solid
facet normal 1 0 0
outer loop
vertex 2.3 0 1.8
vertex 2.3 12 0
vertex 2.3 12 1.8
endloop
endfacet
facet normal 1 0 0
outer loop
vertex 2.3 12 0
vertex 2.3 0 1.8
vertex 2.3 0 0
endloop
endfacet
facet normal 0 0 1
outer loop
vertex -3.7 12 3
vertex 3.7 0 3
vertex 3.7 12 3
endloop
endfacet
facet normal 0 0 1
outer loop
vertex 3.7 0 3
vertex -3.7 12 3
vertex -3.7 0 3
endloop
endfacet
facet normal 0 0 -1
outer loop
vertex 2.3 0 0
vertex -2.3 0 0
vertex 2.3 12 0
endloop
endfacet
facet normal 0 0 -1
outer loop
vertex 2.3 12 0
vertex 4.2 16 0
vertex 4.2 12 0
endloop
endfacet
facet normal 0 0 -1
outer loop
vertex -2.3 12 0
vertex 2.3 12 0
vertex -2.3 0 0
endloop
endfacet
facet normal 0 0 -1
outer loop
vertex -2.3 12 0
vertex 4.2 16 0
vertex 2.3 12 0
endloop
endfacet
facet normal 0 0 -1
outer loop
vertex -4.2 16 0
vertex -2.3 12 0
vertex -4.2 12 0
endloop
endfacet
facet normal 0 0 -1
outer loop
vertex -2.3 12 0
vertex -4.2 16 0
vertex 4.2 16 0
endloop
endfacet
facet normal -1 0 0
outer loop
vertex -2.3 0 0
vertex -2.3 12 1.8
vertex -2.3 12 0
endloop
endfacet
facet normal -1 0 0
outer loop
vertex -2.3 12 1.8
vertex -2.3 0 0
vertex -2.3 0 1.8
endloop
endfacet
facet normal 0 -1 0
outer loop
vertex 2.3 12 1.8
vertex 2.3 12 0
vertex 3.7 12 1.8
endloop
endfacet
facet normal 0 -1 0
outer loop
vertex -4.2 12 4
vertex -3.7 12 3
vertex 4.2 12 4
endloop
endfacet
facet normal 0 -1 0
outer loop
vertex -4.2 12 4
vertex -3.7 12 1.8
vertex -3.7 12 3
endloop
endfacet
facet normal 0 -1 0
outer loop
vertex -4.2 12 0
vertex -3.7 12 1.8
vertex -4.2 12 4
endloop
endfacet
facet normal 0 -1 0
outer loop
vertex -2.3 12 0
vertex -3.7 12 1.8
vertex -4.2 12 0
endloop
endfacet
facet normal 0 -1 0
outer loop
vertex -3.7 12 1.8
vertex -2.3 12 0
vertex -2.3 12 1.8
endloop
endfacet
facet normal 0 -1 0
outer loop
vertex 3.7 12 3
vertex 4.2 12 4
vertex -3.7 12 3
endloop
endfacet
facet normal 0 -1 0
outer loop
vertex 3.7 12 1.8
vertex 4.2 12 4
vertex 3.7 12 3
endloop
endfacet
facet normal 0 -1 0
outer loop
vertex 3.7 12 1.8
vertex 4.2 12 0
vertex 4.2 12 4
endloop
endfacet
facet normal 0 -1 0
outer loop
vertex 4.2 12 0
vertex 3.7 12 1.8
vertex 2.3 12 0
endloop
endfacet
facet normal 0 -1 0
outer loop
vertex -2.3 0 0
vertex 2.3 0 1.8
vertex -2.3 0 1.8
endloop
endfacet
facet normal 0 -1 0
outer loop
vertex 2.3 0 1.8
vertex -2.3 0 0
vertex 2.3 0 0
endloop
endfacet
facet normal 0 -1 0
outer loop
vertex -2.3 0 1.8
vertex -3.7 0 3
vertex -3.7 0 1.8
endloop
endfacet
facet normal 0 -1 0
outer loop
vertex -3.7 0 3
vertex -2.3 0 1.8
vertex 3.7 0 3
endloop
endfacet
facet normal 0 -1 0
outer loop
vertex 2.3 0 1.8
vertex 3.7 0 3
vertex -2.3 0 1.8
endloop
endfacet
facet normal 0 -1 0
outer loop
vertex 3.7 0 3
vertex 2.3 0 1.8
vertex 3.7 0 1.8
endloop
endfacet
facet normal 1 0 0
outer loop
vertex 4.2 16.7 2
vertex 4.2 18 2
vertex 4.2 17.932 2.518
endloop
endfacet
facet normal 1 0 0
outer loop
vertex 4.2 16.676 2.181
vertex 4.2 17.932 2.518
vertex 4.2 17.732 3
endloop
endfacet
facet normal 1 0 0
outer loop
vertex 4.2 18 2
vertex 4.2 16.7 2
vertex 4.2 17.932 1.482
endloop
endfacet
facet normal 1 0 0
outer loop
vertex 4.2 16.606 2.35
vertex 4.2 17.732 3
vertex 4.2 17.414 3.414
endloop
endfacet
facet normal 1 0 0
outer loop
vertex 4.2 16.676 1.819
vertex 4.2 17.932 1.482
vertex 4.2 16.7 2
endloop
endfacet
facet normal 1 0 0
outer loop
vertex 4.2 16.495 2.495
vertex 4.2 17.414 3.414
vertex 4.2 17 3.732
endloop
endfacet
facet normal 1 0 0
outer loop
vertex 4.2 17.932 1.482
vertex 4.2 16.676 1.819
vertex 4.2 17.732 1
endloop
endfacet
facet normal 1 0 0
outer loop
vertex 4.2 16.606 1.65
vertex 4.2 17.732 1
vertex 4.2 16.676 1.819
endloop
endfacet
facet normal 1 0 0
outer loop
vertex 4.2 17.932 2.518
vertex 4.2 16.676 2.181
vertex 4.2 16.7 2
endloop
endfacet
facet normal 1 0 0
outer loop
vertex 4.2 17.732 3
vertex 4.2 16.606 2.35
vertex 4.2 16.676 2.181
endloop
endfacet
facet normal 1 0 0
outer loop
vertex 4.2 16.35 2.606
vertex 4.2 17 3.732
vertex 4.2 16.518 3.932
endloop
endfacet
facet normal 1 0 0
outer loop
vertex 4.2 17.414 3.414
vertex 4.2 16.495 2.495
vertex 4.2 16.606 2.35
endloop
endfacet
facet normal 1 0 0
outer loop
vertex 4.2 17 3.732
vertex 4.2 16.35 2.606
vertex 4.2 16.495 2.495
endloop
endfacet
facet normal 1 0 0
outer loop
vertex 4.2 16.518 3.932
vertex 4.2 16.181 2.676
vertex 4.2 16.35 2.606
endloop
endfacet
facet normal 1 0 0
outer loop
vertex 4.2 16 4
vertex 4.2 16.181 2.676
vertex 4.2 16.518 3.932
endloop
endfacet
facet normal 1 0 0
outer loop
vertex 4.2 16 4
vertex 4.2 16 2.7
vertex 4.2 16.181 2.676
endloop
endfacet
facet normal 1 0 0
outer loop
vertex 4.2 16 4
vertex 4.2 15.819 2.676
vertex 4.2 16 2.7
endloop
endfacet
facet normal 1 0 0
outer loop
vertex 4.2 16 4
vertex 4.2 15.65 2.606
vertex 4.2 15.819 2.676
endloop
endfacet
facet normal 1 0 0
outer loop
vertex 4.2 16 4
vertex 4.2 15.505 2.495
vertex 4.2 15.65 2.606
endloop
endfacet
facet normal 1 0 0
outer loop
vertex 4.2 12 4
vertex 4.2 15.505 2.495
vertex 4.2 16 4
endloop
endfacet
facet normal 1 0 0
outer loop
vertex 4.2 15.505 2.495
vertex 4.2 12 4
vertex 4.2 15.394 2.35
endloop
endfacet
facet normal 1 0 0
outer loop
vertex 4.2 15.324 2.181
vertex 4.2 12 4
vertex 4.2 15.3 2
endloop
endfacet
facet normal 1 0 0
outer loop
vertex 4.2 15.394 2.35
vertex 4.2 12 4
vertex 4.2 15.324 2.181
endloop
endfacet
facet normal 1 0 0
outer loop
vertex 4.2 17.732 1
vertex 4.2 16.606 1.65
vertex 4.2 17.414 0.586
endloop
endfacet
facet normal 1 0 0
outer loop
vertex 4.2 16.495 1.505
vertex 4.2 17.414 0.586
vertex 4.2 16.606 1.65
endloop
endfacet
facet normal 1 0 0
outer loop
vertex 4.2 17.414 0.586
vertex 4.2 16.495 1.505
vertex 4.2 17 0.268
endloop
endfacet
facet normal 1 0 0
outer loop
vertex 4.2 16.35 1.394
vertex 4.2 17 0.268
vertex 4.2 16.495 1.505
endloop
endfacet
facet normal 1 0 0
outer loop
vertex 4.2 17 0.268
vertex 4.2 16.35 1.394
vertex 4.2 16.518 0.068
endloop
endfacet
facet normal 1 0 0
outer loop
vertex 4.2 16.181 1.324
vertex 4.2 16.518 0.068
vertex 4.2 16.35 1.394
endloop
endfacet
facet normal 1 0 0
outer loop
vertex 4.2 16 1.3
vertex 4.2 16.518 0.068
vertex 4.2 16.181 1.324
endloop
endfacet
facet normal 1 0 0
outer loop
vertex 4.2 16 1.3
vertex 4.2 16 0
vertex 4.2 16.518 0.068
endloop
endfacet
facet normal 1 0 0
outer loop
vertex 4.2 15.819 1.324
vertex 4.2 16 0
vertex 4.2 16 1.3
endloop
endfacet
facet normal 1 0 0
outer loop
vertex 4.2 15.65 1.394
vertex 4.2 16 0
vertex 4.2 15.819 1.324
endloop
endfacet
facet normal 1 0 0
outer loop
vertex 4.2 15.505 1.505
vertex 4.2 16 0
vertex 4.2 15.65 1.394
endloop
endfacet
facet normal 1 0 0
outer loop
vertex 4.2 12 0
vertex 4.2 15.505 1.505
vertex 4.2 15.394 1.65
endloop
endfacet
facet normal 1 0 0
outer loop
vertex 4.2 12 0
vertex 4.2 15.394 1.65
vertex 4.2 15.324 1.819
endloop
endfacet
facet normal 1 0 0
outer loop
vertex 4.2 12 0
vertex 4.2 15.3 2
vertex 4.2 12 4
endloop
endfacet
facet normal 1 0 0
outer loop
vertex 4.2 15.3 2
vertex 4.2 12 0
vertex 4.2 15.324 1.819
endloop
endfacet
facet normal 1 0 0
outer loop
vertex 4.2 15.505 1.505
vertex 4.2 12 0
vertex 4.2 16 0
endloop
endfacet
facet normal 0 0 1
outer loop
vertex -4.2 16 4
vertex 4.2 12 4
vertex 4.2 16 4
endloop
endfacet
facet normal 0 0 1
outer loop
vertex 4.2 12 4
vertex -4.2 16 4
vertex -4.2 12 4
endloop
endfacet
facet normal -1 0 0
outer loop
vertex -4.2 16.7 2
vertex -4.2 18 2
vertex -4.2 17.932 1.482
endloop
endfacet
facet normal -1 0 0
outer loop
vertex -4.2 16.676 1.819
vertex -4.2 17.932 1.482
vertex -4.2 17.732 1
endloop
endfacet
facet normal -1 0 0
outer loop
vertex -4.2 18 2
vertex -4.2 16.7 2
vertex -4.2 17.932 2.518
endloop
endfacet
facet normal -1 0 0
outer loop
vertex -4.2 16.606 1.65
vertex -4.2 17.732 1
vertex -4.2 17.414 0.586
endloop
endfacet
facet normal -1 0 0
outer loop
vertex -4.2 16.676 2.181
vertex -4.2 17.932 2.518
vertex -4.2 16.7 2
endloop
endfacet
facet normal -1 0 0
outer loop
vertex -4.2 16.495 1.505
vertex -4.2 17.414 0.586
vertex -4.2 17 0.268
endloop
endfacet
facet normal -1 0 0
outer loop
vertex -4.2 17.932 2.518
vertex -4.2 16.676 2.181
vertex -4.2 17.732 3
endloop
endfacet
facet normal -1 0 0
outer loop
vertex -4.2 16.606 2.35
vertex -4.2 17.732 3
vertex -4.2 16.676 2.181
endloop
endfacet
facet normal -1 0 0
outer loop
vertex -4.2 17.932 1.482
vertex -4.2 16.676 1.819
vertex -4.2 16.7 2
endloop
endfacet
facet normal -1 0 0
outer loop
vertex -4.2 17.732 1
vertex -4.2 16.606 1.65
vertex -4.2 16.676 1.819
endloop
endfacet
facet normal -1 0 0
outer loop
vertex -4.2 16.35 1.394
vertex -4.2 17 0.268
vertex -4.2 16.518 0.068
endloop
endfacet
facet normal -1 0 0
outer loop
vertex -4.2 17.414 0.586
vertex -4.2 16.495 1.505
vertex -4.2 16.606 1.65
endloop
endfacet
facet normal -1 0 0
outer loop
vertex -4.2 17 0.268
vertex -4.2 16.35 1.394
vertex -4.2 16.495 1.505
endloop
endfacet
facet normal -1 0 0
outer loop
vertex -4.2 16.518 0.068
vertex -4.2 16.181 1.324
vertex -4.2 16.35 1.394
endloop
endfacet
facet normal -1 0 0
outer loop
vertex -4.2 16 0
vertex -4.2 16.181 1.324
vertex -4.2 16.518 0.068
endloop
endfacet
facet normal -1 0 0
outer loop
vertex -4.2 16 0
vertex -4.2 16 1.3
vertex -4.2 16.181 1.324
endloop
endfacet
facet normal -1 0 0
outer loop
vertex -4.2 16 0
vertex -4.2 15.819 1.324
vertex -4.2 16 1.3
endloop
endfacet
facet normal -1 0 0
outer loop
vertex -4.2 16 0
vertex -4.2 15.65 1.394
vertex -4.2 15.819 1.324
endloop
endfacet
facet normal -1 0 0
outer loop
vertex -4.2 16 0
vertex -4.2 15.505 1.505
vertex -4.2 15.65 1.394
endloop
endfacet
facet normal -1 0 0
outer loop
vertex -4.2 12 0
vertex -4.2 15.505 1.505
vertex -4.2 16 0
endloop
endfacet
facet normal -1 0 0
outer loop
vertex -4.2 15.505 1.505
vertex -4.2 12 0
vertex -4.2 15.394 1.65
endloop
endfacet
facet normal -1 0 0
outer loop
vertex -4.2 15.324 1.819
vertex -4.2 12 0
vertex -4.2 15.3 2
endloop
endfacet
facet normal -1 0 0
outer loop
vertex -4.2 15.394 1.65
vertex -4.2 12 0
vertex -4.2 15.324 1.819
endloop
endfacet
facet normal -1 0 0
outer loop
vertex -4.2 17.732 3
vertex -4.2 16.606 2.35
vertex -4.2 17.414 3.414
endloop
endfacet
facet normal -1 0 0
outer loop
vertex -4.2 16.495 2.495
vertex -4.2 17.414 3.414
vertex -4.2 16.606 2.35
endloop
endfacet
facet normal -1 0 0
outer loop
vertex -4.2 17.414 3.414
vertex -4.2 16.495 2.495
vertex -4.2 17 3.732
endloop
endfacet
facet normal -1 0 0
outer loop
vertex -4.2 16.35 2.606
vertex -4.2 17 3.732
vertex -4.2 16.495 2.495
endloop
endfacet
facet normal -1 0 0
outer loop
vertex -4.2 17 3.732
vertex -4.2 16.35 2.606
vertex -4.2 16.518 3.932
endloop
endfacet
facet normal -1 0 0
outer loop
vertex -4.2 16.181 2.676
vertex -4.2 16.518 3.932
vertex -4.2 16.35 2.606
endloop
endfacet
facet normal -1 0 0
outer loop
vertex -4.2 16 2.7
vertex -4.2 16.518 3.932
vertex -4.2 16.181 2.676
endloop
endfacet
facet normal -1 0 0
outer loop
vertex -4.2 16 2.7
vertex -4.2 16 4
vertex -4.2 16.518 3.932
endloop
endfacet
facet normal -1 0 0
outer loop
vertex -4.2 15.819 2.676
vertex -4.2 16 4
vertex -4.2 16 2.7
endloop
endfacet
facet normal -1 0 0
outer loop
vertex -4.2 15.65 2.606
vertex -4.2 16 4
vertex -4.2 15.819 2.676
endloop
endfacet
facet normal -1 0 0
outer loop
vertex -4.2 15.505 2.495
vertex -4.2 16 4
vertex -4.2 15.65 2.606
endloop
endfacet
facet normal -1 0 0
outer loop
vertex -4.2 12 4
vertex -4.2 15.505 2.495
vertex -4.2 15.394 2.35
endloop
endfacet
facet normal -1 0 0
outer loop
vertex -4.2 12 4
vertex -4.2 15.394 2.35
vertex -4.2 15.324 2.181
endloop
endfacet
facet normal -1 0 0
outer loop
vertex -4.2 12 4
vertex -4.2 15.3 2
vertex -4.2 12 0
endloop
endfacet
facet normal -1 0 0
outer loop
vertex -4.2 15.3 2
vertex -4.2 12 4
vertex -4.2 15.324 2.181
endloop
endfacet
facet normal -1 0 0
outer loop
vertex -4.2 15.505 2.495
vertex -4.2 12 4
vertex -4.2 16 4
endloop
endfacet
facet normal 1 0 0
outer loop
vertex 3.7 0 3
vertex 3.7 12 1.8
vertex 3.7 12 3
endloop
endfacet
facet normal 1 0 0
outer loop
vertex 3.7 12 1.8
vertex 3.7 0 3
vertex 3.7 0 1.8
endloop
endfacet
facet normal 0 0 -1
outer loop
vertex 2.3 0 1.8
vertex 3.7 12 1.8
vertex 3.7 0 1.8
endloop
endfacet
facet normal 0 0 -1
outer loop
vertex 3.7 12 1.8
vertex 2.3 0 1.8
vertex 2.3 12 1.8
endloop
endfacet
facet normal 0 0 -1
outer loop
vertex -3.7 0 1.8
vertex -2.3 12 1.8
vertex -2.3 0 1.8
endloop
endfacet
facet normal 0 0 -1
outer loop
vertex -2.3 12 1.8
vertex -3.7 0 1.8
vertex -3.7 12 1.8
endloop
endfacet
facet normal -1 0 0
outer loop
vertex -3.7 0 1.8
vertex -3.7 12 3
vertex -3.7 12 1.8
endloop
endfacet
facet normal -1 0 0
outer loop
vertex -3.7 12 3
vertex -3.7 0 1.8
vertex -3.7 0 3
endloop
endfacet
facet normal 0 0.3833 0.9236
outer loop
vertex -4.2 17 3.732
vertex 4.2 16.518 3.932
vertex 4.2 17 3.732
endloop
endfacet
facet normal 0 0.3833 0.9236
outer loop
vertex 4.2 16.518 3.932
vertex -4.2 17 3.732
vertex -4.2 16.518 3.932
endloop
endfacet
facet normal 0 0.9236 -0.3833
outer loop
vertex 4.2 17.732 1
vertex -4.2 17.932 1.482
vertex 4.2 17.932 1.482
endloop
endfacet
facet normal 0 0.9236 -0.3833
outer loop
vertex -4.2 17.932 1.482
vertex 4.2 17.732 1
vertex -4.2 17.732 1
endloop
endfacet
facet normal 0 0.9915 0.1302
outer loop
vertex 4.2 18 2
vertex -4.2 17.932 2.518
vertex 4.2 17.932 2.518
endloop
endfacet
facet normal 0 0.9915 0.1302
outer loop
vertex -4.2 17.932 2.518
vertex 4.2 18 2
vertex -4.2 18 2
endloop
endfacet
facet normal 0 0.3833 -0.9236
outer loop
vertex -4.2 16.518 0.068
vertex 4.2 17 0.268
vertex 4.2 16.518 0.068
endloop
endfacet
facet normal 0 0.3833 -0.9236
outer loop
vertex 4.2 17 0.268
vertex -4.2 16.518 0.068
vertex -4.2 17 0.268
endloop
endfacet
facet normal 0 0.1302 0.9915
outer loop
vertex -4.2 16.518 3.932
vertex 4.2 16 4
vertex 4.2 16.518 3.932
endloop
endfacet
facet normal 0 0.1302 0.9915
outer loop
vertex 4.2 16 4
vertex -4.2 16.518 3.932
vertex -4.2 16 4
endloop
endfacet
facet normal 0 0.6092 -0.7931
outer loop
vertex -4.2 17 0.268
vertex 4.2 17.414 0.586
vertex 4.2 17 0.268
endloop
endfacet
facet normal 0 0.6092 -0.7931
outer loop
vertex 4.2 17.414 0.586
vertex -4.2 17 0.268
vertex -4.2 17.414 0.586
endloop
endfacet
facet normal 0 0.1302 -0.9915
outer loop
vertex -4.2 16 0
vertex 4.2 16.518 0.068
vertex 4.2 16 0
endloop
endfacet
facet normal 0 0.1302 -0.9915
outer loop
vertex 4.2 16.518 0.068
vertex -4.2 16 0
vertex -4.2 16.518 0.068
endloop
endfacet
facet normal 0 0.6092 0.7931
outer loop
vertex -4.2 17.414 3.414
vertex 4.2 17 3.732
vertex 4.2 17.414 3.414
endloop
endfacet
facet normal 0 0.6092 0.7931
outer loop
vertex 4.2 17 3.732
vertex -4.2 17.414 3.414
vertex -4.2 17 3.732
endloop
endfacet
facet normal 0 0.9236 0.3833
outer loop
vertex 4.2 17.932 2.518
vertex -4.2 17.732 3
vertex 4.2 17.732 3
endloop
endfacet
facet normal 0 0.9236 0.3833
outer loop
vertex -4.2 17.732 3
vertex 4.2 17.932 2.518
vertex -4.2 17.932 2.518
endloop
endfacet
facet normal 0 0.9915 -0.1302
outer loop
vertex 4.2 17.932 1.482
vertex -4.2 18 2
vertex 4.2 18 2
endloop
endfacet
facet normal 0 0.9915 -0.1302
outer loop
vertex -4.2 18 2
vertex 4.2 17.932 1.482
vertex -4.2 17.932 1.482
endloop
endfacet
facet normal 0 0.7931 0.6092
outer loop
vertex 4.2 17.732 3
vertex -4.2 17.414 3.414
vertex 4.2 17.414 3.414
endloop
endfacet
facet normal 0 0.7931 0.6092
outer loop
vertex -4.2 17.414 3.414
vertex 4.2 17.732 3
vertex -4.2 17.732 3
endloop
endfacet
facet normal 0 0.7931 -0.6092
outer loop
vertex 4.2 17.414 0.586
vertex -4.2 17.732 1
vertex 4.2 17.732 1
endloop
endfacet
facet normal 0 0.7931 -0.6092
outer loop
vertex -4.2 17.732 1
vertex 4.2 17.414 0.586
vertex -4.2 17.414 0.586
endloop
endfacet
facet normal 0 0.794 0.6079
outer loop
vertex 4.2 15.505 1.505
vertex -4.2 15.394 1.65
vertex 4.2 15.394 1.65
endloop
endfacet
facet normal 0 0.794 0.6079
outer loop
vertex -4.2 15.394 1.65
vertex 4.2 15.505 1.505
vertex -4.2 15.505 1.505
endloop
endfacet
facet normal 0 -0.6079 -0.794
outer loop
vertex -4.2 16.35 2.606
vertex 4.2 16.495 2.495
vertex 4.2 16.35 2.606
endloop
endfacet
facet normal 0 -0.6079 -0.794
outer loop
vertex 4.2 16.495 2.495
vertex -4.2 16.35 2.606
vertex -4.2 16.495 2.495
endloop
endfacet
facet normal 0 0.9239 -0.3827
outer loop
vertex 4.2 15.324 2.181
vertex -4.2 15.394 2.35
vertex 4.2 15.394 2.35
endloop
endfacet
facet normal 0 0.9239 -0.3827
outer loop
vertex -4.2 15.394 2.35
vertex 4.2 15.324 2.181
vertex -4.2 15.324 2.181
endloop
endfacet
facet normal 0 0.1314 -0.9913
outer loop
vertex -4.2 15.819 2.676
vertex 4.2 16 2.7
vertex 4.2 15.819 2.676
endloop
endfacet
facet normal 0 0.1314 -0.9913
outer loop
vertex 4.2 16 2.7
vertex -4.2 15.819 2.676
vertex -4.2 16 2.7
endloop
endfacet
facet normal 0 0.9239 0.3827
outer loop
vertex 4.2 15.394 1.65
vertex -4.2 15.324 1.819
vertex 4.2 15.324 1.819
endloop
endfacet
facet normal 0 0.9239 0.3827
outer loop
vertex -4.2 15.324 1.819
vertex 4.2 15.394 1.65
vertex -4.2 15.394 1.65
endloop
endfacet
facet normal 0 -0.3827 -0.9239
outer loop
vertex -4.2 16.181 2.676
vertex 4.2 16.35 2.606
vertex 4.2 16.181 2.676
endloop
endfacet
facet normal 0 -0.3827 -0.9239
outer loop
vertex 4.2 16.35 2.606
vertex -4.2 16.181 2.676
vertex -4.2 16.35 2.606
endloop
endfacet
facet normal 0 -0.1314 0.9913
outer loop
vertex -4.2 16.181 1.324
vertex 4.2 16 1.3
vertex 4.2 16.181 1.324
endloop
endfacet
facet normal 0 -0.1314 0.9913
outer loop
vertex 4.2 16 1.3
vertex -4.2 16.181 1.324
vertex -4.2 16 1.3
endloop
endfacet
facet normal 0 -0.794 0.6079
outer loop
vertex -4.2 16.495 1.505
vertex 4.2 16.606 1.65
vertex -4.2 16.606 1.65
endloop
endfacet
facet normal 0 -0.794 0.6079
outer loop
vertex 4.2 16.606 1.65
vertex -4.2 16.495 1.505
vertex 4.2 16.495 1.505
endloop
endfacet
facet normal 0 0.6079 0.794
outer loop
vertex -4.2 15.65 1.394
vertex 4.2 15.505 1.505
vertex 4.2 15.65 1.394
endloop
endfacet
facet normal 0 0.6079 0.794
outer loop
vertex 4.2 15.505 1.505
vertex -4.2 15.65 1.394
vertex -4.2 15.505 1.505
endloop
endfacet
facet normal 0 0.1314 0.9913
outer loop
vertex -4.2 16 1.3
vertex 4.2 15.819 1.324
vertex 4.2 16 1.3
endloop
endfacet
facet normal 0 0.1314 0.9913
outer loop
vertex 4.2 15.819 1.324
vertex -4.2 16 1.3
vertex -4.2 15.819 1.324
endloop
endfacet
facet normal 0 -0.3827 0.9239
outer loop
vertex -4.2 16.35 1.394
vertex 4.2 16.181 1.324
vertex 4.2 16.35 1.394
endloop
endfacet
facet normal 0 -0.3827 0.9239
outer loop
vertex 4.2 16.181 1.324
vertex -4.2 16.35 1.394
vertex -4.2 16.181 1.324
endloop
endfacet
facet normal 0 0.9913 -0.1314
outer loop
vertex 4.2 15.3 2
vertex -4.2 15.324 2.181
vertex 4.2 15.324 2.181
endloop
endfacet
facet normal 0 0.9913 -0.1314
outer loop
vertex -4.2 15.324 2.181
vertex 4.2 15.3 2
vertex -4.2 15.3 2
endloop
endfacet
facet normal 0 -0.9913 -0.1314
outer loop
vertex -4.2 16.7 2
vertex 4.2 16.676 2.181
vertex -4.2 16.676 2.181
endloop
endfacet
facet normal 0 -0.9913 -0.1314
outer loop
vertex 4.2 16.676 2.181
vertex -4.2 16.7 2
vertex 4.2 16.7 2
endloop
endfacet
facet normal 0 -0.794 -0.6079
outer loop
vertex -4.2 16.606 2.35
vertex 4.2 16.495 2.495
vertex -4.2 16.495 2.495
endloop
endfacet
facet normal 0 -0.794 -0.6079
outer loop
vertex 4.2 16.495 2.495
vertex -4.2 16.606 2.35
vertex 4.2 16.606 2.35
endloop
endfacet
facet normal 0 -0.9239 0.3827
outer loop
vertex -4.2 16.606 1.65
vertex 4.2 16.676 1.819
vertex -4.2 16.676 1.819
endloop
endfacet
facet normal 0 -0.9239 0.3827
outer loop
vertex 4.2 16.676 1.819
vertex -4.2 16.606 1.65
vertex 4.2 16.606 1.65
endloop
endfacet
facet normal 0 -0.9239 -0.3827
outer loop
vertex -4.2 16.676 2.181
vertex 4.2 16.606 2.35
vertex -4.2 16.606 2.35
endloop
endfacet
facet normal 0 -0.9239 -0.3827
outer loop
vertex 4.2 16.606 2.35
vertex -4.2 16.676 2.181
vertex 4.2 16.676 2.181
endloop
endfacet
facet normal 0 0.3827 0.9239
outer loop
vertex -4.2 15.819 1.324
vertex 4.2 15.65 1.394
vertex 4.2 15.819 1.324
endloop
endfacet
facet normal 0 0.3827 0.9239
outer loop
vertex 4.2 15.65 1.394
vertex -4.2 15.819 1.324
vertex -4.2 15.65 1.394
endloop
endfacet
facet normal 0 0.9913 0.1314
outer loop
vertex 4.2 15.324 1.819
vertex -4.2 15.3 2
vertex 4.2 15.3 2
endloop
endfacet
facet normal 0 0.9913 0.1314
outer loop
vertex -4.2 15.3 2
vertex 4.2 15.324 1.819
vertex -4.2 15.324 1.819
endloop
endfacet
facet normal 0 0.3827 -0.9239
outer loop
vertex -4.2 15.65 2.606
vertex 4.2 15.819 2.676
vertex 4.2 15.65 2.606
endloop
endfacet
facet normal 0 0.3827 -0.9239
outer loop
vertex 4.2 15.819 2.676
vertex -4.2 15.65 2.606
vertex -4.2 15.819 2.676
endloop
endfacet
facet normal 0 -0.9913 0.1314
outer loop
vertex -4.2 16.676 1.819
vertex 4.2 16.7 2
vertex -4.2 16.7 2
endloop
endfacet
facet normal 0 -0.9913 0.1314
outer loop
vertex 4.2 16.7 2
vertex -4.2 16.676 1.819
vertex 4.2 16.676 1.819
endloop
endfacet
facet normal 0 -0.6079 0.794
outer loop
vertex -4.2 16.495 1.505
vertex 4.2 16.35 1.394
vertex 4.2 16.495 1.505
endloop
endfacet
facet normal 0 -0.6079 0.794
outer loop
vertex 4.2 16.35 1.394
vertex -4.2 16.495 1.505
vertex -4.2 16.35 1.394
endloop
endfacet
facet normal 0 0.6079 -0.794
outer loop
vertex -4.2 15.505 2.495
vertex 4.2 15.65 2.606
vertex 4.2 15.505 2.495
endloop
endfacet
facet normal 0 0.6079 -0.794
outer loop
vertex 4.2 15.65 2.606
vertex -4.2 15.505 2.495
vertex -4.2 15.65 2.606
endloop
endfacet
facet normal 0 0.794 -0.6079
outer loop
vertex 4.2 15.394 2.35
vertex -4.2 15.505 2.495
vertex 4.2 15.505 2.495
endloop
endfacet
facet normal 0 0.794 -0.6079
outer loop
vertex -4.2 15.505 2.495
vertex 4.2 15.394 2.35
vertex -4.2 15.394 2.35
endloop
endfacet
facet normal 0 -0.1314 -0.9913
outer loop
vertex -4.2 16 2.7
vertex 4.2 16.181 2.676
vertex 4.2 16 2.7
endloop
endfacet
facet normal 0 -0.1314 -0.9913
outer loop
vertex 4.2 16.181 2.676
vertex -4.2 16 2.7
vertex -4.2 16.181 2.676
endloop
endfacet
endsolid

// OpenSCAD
// Ersatzscharnier fuer ein stylisches Alu-Brillenetui mit Magnetverschluss-Klappdeckel.
// Aus Stabilitaetsgruenden wurde die Aussparung fuer die Feder weggelassen.
//
// Das T-Profil passt genau in das Alu-Profil 
// Das kleine Loch fuer die Achse musste leider nachgebohrt werden.
//
// A. Merz, 2021-12-20, GPL v3



c=0.4;  // clearance - roughly one nozzle width

module scharnierA(
    x1=5-c,
    x2=7.8-c,
    x3=8.8-c,
    y1=4,
    y2=12,
    z1=1.6-c,
    z2=3,
    z3=4
    ) {
	difference() {
	  union() {
            translate([ -x1/2,     0,    0  ]) cube([x1, y2, z2], center=false );
            translate([ -x3/2,    y2,    0  ]) cube([x3, y1, z3], center=false );
            translate([ -x2/2,     0, z2-z1 ]) cube([x2, y2, z1], center=false );
	    translate([ -x3/2, y1+y2, z3/2  ]) rotate([0,90,0]) cylinder(h=x3, d=z3, $fn=24);
	  }
	    translate([ -x3/2-0.1, y1+y2, z3/2  ]) rotate([0,90,0]) cylinder(h=x3+0.2, d=1+c, $fn=24);
	}
}



//------------- Instances --------------------
scharnierA();
